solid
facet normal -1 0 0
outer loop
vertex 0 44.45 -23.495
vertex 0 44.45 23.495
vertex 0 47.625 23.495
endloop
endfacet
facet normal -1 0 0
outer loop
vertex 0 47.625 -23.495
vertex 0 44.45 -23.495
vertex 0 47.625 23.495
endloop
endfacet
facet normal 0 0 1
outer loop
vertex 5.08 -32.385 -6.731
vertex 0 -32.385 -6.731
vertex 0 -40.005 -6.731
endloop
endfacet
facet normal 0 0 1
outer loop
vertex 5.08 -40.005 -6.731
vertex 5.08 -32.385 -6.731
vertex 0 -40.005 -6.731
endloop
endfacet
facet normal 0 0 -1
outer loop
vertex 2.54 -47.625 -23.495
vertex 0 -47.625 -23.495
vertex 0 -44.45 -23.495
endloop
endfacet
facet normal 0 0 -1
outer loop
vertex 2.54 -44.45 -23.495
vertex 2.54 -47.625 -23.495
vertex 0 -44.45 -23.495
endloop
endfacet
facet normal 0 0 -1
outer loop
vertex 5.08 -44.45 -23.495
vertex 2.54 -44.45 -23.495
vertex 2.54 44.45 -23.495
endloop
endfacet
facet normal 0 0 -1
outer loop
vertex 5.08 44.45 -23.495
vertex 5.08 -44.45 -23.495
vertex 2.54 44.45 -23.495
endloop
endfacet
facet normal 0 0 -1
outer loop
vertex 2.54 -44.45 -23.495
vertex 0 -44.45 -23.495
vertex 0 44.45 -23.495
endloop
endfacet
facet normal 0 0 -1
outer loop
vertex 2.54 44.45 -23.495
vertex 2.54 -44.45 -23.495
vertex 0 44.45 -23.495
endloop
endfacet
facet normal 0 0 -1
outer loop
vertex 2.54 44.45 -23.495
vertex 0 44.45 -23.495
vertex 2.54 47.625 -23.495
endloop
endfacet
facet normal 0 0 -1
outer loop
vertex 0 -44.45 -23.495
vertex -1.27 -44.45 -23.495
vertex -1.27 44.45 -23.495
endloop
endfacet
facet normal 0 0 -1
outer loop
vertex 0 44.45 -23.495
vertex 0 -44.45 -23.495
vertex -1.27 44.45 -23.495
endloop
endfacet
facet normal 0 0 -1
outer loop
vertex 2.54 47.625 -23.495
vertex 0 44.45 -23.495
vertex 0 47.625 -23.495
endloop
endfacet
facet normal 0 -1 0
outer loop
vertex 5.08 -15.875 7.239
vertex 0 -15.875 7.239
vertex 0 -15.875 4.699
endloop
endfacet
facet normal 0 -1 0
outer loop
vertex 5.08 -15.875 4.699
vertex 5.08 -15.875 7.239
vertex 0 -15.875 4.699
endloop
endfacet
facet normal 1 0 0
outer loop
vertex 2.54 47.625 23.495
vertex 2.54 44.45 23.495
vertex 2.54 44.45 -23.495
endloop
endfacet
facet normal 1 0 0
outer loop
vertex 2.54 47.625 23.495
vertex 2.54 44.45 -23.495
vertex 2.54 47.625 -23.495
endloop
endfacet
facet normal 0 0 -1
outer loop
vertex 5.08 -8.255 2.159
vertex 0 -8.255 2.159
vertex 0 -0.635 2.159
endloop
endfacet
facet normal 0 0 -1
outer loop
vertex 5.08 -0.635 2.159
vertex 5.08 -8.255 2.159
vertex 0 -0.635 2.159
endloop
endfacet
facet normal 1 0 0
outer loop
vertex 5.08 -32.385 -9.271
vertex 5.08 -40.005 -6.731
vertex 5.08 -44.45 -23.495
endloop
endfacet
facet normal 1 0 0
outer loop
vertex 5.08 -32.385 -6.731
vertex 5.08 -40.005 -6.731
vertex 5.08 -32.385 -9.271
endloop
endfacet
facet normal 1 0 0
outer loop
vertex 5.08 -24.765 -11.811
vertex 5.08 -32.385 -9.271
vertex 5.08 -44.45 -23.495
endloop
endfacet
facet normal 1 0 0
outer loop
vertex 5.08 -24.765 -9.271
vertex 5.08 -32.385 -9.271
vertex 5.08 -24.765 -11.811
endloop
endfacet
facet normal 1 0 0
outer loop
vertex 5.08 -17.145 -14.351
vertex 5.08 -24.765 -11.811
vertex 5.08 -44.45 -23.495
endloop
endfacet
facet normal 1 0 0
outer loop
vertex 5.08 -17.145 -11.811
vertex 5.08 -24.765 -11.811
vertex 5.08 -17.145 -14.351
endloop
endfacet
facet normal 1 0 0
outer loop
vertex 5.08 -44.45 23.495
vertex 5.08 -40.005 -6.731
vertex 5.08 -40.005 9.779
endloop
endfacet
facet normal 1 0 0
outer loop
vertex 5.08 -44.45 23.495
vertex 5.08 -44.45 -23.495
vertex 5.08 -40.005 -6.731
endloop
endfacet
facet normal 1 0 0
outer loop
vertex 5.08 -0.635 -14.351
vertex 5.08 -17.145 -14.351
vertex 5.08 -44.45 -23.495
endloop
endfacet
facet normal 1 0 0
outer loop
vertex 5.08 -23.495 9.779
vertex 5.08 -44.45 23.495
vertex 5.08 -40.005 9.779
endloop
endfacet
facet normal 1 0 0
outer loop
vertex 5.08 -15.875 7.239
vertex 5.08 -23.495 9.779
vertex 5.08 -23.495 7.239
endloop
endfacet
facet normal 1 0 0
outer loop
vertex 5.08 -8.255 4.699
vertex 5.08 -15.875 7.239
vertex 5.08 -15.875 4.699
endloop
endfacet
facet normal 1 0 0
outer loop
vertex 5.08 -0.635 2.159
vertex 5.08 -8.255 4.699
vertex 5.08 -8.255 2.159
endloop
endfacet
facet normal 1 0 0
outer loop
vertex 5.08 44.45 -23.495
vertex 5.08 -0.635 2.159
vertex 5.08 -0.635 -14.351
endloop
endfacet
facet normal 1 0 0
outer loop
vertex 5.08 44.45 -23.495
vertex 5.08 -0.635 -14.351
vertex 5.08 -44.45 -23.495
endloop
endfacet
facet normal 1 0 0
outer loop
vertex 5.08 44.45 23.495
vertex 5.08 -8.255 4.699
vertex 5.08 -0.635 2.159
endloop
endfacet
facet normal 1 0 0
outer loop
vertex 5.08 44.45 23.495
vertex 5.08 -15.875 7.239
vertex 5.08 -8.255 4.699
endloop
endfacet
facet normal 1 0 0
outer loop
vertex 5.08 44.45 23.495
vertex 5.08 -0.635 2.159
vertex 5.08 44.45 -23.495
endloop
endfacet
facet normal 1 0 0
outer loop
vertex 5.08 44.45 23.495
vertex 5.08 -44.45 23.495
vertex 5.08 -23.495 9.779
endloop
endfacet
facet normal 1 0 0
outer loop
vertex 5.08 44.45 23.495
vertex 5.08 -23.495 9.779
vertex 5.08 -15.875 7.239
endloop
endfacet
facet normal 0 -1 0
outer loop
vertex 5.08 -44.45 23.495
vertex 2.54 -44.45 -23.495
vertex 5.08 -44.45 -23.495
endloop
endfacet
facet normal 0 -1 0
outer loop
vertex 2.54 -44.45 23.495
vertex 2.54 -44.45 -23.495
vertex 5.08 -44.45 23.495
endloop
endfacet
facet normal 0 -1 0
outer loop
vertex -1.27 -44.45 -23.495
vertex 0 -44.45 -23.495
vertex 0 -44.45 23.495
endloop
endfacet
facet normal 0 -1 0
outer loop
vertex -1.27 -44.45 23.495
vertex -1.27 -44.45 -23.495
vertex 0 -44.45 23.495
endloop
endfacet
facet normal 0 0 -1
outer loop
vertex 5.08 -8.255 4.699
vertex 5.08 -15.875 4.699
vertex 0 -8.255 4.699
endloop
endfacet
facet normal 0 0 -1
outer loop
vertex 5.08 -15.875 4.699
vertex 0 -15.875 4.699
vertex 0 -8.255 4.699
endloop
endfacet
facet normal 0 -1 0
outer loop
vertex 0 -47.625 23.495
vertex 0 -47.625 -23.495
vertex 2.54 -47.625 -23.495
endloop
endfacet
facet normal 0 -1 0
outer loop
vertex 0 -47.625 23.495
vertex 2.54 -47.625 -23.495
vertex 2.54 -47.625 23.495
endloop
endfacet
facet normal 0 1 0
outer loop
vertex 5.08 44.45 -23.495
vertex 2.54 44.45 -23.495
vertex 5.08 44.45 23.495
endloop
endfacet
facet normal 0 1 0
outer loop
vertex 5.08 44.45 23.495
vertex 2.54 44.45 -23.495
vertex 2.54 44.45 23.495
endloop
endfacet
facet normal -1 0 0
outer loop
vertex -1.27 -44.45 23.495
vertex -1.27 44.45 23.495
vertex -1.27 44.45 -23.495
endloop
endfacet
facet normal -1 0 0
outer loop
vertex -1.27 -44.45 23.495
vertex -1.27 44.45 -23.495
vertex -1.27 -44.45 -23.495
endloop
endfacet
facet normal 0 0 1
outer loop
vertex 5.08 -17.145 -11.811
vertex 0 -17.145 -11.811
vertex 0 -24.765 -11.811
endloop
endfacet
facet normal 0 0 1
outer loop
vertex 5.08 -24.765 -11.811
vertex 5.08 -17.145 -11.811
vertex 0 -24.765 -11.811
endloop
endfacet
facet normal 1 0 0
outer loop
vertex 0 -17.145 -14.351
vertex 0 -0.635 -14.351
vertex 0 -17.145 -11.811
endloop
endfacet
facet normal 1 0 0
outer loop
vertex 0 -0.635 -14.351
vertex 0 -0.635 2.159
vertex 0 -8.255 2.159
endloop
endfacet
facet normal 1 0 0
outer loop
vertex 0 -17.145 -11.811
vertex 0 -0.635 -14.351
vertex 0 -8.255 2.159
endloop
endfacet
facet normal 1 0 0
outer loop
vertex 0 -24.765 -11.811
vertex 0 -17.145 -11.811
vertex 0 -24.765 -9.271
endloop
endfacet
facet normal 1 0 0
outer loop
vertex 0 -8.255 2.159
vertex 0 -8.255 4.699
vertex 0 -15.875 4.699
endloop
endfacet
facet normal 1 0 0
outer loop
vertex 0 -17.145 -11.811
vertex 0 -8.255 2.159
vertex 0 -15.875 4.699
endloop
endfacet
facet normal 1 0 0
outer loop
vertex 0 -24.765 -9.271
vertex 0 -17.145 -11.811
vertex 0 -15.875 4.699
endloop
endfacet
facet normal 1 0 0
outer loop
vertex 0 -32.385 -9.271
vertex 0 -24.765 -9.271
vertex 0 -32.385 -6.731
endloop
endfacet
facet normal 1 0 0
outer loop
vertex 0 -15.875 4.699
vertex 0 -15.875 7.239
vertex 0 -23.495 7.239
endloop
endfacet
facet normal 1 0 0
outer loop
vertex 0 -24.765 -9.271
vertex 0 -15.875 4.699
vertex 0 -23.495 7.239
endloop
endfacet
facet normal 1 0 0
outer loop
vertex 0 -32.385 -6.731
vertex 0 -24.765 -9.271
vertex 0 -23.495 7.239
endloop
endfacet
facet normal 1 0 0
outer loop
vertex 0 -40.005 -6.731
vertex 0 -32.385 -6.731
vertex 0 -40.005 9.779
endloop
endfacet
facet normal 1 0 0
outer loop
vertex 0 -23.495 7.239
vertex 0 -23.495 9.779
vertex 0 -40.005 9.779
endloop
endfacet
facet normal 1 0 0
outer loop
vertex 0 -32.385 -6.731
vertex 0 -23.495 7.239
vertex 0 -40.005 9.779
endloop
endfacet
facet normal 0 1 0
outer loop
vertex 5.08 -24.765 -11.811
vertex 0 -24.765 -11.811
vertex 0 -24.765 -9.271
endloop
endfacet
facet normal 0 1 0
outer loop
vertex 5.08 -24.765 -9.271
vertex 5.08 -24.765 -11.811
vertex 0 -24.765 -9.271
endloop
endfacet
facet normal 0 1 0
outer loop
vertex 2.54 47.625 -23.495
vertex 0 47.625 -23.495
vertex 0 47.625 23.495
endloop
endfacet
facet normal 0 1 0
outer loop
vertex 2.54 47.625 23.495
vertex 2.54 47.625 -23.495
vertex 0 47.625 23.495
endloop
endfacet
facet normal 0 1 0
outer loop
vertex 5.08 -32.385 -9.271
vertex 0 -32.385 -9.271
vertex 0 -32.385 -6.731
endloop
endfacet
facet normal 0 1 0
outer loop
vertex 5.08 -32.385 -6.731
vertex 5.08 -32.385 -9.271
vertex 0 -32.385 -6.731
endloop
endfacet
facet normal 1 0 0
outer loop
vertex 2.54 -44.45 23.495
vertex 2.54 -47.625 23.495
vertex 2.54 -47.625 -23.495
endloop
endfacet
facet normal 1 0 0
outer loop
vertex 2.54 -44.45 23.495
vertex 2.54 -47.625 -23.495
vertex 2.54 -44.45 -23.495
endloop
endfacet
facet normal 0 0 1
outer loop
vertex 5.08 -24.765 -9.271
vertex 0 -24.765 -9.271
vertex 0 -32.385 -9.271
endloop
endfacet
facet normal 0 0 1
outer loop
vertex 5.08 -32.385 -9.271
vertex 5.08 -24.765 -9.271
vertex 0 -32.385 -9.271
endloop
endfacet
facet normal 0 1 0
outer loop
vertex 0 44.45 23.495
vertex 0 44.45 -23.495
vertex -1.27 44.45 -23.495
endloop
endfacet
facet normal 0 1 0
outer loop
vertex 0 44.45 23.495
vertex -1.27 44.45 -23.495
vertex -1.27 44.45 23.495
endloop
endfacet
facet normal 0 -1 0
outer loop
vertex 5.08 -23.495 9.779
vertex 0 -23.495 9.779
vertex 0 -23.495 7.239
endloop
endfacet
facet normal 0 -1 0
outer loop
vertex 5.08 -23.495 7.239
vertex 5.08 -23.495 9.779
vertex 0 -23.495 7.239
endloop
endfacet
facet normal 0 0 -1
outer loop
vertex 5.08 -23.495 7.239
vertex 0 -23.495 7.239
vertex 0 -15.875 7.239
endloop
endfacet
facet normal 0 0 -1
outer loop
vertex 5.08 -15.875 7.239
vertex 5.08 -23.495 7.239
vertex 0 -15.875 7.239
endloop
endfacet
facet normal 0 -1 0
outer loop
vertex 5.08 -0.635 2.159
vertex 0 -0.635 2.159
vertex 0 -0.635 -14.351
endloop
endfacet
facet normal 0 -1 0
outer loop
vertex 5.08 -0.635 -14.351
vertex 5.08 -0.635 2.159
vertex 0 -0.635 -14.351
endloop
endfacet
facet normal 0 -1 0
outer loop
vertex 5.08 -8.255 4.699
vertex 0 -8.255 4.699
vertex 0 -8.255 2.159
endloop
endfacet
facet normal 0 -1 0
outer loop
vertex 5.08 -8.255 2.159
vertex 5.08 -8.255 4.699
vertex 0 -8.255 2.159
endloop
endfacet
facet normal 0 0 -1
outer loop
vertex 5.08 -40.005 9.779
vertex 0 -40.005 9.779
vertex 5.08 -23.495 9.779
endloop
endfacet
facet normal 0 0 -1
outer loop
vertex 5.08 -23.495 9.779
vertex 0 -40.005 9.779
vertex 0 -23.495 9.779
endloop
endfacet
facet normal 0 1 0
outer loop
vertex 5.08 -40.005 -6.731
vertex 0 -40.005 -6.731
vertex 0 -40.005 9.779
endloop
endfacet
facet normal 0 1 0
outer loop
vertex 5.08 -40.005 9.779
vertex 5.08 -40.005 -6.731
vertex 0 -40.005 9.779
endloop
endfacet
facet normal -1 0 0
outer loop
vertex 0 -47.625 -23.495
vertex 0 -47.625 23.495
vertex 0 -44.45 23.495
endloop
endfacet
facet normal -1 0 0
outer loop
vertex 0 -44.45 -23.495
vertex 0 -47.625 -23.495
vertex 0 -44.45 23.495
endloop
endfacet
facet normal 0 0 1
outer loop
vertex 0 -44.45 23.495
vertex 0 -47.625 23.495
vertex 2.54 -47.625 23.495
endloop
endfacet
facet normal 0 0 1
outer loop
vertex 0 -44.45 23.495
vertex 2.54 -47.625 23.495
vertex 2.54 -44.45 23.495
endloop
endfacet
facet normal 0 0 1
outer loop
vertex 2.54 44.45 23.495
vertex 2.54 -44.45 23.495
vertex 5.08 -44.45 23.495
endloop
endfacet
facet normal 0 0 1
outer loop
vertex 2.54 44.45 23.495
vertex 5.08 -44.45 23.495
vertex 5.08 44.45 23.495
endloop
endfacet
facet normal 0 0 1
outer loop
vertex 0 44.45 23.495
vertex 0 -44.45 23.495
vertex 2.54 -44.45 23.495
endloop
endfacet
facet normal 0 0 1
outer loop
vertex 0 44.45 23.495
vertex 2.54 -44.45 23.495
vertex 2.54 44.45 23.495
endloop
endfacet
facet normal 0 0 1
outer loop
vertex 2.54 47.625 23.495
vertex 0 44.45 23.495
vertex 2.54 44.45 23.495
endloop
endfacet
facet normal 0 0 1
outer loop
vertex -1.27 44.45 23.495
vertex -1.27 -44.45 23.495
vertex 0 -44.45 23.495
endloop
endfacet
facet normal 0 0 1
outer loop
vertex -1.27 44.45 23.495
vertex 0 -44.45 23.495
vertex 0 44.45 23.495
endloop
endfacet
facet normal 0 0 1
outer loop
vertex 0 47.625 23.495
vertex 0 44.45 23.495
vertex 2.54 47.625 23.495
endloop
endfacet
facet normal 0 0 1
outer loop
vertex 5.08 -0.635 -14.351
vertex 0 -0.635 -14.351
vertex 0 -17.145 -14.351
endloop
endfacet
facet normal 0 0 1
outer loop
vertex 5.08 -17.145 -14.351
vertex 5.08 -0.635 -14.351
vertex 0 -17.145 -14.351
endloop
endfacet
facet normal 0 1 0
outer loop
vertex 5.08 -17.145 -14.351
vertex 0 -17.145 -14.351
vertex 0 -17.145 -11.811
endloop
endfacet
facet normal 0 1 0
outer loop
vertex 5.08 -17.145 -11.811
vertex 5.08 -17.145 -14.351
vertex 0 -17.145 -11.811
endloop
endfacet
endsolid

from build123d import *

# Parameters (mm, degrees)
F0_W     = 95.25
F0_H     = 46.99
F1_DEPTH = 2.54
F2_W     = 88.9
F2_H     = 46.99
F3_DEPTH = 1.27
F4_W     = 88.9
F4_H     = 46.99
F5_DEPTH = 2.54


with BuildPart() as f1:
    # F0 (on Right) → F1 (new body)
    with BuildSketch(Plane.YZ):
        Rectangle(F0_W, F0_H)
        Polygon((-0.635, 2.159), (-0.635, -14.351), (-17.145, -14.351), (-17.145, -11.811), (-24.765, -11.811), (-24.765, -9.271), (-32.385, -9.271), (-32.385, -6.731), (-40.005, -6.731), (-40.005, 9.779), (-23.495, 9.779), (-23.495, 7.239), (-15.875, 7.239), (-15.875, 4.699), (-8.255, 4.699), (-8.255, 2.159), align=None, mode=Mode.SUBTRACT)
    extrude(amount=F1_DEPTH)

    # F2 (on face) → F3 (join)
    with BuildSketch(Plane(origin=(0, 0, 0), x_dir=(0, -1, 0), z_dir=(-1, 0, 0))):
        Rectangle(F2_W, F2_H)
        Polygon((0.635, 2.159), (8.255, 2.159), (8.255, 4.699), (15.875, 4.699), (15.875, 7.239), (23.495, 7.239), (23.495, 9.779), (40.005, 9.779), (40.005, -6.731), (32.385, -6.731), (32.385, -9.271), (24.765, -9.271), (24.765, -11.811), (17.145, -11.811), (17.145, -14.351), (0.635, -14.351), align=None, mode=Mode.SUBTRACT)
        Polygon((8.255, 4.699), (8.255, 2.159), (0.635, 2.159), (0.635, -14.351), (17.145, -14.351), (17.145, -11.811), (24.765, -11.811), (24.765, -9.271), (32.385, -9.271), (32.385, -6.731), (40.005, -6.731), (40.005, 9.779), (23.495, 9.779), (23.495, 7.239), (15.875, 7.239), (15.875, 4.699), align=None)
    extrude(amount=F3_DEPTH)

    # F4 (on face) → F5 (join)
    with BuildSketch(Plane.YZ.offset(2.54)):
        Rectangle(F4_W, F4_H)
        Polygon((-15.875, 4.699), (-8.255, 4.699), (-8.255, 2.159), (-0.635, 2.159), (-0.635, -14.351), (-17.145, -14.351), (-17.145, -11.811), (-24.765, -11.811), (-24.765, -9.271), (-32.385, -9.271), (-32.385, -6.731), (-40.005, -6.731), (-40.005, 9.779), (-23.495, 9.779), (-23.495, 7.239), (-15.875, 7.239), align=None, mode=Mode.SUBTRACT)
    extrude(amount=F5_DEPTH)


solid = f1.part
